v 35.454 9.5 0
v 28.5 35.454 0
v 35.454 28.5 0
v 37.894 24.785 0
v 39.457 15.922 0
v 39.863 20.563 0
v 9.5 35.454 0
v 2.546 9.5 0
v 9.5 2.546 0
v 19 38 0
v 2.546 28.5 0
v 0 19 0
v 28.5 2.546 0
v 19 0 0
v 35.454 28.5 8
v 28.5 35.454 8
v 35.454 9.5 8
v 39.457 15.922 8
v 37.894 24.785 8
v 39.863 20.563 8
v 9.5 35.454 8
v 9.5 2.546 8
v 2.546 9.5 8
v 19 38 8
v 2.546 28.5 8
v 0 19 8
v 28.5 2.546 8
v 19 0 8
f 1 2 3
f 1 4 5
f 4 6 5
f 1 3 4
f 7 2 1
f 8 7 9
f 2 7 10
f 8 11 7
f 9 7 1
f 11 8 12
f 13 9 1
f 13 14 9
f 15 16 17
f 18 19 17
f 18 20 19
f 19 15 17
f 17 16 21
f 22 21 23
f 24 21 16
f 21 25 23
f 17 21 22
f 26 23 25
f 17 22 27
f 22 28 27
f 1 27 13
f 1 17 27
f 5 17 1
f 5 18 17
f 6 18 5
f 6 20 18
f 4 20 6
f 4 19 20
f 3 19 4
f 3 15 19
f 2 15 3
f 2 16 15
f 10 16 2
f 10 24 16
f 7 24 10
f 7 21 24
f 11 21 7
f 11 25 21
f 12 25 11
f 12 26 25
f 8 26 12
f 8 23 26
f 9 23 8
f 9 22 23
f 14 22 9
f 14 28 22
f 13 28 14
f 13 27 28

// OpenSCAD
$fn = 32;

// ----------------------------------------------------------------------
// Eccentric disc: step, 8 mm thick
// ----------------------------------------------------------------------

// --- parameters (mm) ---
profile_height = 8;       // extrusion height
profile_points = 14;      // points of the closed outline

profile = [[0, 19], [2.546, 9.5], [9.5, 2.546], [19, 0], [28.5, 2.546], [35.454, 9.5], [39.457, 15.922], [39.863, 20.563], [37.894, 24.785], [35.454, 28.5], [28.5, 35.454], [19, 38], [9.5, 35.454], [2.546, 28.5]];  // single closed polygon, 14 points, counter clockwise

// --- the one profile operation ---
linear_extrude(height = profile_height) polygon(points = profile);
